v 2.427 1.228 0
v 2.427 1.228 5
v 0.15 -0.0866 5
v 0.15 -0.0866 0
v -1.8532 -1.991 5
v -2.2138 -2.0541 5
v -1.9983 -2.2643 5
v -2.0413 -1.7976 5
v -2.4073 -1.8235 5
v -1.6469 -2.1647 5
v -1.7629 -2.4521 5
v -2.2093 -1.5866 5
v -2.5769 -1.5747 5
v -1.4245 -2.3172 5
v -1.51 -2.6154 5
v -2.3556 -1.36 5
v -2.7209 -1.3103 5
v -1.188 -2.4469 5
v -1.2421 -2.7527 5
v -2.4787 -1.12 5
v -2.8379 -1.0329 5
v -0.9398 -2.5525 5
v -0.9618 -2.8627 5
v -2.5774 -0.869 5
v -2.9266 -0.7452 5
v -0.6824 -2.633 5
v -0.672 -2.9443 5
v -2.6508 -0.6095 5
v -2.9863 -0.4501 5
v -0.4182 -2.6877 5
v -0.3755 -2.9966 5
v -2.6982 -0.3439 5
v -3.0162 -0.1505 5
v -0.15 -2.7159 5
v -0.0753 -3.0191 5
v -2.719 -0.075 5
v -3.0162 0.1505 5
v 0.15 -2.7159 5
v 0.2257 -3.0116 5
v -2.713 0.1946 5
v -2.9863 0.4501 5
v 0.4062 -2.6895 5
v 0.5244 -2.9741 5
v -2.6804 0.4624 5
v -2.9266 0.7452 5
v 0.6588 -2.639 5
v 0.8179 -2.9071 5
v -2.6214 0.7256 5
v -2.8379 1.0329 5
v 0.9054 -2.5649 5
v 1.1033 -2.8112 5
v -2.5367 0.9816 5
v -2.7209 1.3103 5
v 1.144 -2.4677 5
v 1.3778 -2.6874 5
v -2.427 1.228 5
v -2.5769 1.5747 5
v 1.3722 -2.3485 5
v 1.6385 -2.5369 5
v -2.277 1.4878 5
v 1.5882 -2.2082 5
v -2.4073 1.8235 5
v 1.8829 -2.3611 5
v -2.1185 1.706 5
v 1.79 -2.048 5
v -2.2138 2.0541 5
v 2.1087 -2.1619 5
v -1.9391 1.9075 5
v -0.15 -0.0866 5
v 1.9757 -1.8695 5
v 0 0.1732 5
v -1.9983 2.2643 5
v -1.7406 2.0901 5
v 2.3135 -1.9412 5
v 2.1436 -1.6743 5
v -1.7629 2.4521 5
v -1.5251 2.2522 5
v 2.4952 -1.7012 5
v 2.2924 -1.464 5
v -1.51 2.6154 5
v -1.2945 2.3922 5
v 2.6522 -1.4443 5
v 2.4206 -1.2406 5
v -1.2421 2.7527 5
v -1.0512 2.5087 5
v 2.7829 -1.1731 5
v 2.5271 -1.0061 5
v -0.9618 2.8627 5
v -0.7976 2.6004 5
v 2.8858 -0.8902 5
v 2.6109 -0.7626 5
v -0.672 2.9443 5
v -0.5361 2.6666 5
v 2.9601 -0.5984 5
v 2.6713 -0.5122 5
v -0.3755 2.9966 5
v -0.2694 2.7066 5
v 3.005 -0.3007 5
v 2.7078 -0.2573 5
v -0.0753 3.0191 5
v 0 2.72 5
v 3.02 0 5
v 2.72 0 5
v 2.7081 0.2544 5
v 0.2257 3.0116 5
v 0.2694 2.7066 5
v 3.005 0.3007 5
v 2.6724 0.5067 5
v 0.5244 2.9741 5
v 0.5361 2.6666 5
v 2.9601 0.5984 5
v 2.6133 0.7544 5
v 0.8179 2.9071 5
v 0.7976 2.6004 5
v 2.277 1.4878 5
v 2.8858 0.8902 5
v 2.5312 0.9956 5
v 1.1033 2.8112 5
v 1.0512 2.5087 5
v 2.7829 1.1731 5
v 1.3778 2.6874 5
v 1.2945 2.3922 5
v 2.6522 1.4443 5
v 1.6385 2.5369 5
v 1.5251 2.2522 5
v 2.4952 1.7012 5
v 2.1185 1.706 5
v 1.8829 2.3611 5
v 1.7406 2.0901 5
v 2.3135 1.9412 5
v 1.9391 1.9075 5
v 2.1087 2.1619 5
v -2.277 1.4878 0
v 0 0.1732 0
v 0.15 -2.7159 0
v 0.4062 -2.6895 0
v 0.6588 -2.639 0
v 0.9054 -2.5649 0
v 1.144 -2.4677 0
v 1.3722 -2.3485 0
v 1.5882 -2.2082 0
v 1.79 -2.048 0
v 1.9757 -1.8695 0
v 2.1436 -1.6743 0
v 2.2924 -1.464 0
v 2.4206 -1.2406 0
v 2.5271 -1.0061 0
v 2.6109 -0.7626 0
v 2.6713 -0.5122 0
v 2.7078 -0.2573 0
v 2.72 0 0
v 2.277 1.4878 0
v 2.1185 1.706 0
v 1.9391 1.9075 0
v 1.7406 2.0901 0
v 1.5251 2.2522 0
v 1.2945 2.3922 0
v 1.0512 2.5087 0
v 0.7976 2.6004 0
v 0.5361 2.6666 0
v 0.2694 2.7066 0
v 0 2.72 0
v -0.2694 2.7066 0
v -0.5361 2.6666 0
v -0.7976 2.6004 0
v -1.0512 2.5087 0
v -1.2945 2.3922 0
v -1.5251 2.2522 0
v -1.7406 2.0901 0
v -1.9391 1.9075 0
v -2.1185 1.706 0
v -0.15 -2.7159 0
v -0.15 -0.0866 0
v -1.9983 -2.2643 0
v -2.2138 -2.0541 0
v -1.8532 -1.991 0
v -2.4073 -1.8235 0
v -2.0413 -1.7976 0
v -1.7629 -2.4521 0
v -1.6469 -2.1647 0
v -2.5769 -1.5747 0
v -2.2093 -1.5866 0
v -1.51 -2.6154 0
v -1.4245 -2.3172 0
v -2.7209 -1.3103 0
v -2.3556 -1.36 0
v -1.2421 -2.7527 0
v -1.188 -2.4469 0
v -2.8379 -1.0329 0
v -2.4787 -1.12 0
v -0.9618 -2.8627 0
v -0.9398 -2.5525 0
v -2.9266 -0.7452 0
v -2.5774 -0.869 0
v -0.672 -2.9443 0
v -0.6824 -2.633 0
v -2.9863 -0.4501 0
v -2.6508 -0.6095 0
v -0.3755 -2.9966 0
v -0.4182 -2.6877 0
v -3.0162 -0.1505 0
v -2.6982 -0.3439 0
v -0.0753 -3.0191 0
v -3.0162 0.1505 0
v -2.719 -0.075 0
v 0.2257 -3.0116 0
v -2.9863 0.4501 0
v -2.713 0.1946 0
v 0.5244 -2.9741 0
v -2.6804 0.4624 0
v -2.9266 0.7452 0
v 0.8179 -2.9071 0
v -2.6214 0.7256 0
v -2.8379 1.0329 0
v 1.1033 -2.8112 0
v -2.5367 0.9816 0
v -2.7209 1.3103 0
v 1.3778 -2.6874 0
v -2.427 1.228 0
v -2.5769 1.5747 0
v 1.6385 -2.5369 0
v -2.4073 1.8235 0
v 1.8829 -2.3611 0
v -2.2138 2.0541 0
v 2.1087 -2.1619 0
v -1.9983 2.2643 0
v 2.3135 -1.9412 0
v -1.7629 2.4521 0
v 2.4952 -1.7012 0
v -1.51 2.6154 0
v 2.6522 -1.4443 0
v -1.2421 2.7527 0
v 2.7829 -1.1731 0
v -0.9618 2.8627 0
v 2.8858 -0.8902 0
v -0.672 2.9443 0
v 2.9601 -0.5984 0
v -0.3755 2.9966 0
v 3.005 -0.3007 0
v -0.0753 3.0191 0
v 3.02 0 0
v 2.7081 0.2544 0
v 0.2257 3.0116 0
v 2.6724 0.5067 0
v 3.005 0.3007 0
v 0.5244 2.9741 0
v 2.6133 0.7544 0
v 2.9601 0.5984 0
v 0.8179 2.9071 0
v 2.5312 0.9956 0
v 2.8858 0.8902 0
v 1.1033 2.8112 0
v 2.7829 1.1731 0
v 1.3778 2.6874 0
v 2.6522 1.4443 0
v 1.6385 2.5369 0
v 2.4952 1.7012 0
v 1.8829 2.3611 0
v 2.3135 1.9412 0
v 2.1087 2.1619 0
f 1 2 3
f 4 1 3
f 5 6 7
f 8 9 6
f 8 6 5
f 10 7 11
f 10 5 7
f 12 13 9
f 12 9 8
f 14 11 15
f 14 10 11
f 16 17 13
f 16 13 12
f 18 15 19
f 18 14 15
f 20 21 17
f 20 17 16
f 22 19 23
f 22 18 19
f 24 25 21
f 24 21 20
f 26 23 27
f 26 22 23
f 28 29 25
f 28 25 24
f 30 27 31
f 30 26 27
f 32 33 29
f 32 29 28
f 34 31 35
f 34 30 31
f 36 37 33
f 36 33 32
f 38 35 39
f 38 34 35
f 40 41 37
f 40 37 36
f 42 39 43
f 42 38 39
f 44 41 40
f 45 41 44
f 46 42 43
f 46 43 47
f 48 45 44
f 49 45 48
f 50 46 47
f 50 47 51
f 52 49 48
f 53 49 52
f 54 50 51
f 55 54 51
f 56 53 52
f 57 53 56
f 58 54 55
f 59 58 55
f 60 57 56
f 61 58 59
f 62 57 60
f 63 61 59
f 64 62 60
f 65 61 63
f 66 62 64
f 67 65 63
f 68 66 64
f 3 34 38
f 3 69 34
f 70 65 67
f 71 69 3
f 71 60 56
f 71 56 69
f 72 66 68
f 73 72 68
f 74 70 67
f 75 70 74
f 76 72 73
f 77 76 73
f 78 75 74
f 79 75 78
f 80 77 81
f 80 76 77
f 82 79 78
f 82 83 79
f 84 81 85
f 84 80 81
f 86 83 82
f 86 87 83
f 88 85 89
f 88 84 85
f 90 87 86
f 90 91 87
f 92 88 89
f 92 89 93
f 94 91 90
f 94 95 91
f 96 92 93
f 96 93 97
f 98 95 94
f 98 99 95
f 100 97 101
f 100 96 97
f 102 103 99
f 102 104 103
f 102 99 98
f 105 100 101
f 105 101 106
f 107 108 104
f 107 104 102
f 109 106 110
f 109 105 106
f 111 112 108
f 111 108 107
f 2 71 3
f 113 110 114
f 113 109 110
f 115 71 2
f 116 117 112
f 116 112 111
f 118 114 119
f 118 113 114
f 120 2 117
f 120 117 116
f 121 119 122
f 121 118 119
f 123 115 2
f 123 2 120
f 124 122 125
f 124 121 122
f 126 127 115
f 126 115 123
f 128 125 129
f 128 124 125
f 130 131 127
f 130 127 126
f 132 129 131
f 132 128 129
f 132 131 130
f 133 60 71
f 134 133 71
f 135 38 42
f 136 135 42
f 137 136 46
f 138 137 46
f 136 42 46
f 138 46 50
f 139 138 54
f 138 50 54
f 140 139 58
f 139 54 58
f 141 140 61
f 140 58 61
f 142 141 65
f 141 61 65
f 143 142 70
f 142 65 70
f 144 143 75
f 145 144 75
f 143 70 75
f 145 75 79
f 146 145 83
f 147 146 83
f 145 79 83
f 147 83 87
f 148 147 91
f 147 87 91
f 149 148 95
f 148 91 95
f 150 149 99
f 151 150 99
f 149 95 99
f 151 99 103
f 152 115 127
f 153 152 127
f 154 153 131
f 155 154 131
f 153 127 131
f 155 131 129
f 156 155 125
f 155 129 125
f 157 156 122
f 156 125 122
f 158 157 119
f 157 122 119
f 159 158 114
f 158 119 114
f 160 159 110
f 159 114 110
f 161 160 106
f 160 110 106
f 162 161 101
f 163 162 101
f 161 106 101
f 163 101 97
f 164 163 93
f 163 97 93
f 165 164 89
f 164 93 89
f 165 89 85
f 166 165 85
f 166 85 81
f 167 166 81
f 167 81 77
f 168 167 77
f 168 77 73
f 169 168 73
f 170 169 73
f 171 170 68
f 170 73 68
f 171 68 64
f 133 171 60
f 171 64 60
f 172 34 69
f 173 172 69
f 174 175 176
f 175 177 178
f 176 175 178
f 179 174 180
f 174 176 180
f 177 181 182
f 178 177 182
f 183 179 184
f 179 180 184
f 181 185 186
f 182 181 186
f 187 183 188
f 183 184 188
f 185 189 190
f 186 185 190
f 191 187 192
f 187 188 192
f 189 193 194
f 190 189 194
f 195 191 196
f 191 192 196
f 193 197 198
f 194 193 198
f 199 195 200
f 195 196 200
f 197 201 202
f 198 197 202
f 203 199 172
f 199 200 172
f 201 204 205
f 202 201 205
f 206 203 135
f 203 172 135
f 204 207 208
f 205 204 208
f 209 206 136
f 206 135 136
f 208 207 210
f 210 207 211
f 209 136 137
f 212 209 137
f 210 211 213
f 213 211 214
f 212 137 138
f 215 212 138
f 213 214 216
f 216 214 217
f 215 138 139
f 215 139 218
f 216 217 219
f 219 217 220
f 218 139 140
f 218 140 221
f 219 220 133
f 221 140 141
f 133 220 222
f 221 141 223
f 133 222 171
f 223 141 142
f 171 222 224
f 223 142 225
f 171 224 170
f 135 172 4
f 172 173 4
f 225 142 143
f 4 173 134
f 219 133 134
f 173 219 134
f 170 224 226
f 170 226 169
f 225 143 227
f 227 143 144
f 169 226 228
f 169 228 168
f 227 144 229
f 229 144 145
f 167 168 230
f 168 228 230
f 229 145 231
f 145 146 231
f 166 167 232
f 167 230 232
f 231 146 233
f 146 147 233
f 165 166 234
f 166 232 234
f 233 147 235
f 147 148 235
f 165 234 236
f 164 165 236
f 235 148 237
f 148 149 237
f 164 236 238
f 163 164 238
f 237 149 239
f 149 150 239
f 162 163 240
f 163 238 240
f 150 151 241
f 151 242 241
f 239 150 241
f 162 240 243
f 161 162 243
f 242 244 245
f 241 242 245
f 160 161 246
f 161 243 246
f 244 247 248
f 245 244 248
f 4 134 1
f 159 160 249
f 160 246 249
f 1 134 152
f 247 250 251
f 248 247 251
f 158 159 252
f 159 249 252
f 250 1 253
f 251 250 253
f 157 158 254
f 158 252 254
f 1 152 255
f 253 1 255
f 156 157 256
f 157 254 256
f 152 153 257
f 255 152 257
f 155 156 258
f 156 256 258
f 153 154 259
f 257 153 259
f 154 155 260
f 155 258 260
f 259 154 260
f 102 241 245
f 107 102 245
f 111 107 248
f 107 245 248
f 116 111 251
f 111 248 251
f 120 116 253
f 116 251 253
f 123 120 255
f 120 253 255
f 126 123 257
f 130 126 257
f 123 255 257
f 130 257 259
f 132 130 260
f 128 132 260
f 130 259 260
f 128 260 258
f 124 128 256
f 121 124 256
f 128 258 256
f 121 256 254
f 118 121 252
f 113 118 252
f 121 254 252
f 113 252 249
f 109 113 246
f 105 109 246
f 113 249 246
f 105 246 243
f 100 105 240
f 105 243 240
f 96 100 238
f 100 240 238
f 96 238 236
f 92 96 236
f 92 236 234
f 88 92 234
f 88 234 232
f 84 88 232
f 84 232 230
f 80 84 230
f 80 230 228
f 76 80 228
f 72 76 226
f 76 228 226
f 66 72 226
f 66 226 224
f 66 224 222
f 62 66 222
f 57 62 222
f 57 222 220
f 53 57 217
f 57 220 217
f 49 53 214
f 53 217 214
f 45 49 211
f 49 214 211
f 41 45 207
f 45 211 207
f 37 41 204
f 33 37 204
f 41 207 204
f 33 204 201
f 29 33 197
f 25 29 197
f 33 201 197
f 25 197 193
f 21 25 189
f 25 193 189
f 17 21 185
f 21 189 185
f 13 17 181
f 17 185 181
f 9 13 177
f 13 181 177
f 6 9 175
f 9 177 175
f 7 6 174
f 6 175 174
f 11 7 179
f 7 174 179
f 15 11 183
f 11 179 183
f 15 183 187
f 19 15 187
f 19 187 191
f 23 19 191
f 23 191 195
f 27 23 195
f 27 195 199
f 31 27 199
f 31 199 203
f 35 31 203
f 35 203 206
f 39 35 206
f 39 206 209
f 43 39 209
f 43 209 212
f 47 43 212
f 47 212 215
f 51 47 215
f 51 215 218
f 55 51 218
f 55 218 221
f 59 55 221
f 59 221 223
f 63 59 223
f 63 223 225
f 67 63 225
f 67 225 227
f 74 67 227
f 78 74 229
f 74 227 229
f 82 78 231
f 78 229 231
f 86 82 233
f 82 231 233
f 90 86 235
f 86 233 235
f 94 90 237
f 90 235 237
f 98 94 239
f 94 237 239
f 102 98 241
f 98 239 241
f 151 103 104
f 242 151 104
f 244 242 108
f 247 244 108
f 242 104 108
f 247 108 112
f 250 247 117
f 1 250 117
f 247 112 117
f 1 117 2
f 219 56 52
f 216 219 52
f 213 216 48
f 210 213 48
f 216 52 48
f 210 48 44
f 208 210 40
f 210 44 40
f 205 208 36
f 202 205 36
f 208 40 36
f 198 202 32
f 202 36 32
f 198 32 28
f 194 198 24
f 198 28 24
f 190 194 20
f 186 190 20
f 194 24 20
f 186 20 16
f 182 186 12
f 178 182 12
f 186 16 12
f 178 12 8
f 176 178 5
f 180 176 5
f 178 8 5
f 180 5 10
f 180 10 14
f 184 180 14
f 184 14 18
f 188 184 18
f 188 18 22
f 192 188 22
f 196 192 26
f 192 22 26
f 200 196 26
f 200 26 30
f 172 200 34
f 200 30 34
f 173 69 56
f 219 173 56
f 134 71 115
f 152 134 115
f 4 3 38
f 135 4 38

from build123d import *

# Parameters (mm, degrees)
F0_R     = 3.02
F1_DEPTH = 5
F3_DEPTH = 5


with BuildPart() as f1:
    # F0 (on Top) → F1 (new body)
    with BuildSketch(Plane.XY):
        Circle(F0_R)
    extrude(amount=F1_DEPTH)

    # F2 (on face) → F3 (cut)
    with BuildSketch(Plane.XY.offset(5)):
        with BuildLine():
            ThreePointArc((-2.4270044643, 1.2280266), (-2.3555890983, -1.36), (-0.15, -2.7158608212))
            Line((-0.15, -2.7158608212), (-0.15, -0.0866025404))
            Line((-0.15, -0.0866025404), (-2.4270044643, 1.2280266))
        make_face()
        with BuildLine():
            Line((0, 0.1732050808), (2.2770044643, 1.4878342212))
            ThreePointArc((2.2770044643, 1.4878342212), (0, 2.72), (-2.2770044643, 1.4878342212))
            Line((-2.2770044643, 1.4878342212), (0, 0.1732050808))
        make_face()
        with BuildLine():
            ThreePointArc((0.15, -2.7158608212), (1.9756517912, -1.8695453993), (2.72, 0))
            ThreePointArc((2.72, 0), (2.6457373398, 0.6312479137), (2.4270044643, 1.2280266))
            Line((2.4270044643, 1.2280266), (0.15, -0.0866025404))
            Line((0.15, -0.0866025404), (0.15, -2.7158608212))
        make_face()
    extrude(amount=-F3_DEPTH, mode=Mode.SUBTRACT)


solid = f1.part
